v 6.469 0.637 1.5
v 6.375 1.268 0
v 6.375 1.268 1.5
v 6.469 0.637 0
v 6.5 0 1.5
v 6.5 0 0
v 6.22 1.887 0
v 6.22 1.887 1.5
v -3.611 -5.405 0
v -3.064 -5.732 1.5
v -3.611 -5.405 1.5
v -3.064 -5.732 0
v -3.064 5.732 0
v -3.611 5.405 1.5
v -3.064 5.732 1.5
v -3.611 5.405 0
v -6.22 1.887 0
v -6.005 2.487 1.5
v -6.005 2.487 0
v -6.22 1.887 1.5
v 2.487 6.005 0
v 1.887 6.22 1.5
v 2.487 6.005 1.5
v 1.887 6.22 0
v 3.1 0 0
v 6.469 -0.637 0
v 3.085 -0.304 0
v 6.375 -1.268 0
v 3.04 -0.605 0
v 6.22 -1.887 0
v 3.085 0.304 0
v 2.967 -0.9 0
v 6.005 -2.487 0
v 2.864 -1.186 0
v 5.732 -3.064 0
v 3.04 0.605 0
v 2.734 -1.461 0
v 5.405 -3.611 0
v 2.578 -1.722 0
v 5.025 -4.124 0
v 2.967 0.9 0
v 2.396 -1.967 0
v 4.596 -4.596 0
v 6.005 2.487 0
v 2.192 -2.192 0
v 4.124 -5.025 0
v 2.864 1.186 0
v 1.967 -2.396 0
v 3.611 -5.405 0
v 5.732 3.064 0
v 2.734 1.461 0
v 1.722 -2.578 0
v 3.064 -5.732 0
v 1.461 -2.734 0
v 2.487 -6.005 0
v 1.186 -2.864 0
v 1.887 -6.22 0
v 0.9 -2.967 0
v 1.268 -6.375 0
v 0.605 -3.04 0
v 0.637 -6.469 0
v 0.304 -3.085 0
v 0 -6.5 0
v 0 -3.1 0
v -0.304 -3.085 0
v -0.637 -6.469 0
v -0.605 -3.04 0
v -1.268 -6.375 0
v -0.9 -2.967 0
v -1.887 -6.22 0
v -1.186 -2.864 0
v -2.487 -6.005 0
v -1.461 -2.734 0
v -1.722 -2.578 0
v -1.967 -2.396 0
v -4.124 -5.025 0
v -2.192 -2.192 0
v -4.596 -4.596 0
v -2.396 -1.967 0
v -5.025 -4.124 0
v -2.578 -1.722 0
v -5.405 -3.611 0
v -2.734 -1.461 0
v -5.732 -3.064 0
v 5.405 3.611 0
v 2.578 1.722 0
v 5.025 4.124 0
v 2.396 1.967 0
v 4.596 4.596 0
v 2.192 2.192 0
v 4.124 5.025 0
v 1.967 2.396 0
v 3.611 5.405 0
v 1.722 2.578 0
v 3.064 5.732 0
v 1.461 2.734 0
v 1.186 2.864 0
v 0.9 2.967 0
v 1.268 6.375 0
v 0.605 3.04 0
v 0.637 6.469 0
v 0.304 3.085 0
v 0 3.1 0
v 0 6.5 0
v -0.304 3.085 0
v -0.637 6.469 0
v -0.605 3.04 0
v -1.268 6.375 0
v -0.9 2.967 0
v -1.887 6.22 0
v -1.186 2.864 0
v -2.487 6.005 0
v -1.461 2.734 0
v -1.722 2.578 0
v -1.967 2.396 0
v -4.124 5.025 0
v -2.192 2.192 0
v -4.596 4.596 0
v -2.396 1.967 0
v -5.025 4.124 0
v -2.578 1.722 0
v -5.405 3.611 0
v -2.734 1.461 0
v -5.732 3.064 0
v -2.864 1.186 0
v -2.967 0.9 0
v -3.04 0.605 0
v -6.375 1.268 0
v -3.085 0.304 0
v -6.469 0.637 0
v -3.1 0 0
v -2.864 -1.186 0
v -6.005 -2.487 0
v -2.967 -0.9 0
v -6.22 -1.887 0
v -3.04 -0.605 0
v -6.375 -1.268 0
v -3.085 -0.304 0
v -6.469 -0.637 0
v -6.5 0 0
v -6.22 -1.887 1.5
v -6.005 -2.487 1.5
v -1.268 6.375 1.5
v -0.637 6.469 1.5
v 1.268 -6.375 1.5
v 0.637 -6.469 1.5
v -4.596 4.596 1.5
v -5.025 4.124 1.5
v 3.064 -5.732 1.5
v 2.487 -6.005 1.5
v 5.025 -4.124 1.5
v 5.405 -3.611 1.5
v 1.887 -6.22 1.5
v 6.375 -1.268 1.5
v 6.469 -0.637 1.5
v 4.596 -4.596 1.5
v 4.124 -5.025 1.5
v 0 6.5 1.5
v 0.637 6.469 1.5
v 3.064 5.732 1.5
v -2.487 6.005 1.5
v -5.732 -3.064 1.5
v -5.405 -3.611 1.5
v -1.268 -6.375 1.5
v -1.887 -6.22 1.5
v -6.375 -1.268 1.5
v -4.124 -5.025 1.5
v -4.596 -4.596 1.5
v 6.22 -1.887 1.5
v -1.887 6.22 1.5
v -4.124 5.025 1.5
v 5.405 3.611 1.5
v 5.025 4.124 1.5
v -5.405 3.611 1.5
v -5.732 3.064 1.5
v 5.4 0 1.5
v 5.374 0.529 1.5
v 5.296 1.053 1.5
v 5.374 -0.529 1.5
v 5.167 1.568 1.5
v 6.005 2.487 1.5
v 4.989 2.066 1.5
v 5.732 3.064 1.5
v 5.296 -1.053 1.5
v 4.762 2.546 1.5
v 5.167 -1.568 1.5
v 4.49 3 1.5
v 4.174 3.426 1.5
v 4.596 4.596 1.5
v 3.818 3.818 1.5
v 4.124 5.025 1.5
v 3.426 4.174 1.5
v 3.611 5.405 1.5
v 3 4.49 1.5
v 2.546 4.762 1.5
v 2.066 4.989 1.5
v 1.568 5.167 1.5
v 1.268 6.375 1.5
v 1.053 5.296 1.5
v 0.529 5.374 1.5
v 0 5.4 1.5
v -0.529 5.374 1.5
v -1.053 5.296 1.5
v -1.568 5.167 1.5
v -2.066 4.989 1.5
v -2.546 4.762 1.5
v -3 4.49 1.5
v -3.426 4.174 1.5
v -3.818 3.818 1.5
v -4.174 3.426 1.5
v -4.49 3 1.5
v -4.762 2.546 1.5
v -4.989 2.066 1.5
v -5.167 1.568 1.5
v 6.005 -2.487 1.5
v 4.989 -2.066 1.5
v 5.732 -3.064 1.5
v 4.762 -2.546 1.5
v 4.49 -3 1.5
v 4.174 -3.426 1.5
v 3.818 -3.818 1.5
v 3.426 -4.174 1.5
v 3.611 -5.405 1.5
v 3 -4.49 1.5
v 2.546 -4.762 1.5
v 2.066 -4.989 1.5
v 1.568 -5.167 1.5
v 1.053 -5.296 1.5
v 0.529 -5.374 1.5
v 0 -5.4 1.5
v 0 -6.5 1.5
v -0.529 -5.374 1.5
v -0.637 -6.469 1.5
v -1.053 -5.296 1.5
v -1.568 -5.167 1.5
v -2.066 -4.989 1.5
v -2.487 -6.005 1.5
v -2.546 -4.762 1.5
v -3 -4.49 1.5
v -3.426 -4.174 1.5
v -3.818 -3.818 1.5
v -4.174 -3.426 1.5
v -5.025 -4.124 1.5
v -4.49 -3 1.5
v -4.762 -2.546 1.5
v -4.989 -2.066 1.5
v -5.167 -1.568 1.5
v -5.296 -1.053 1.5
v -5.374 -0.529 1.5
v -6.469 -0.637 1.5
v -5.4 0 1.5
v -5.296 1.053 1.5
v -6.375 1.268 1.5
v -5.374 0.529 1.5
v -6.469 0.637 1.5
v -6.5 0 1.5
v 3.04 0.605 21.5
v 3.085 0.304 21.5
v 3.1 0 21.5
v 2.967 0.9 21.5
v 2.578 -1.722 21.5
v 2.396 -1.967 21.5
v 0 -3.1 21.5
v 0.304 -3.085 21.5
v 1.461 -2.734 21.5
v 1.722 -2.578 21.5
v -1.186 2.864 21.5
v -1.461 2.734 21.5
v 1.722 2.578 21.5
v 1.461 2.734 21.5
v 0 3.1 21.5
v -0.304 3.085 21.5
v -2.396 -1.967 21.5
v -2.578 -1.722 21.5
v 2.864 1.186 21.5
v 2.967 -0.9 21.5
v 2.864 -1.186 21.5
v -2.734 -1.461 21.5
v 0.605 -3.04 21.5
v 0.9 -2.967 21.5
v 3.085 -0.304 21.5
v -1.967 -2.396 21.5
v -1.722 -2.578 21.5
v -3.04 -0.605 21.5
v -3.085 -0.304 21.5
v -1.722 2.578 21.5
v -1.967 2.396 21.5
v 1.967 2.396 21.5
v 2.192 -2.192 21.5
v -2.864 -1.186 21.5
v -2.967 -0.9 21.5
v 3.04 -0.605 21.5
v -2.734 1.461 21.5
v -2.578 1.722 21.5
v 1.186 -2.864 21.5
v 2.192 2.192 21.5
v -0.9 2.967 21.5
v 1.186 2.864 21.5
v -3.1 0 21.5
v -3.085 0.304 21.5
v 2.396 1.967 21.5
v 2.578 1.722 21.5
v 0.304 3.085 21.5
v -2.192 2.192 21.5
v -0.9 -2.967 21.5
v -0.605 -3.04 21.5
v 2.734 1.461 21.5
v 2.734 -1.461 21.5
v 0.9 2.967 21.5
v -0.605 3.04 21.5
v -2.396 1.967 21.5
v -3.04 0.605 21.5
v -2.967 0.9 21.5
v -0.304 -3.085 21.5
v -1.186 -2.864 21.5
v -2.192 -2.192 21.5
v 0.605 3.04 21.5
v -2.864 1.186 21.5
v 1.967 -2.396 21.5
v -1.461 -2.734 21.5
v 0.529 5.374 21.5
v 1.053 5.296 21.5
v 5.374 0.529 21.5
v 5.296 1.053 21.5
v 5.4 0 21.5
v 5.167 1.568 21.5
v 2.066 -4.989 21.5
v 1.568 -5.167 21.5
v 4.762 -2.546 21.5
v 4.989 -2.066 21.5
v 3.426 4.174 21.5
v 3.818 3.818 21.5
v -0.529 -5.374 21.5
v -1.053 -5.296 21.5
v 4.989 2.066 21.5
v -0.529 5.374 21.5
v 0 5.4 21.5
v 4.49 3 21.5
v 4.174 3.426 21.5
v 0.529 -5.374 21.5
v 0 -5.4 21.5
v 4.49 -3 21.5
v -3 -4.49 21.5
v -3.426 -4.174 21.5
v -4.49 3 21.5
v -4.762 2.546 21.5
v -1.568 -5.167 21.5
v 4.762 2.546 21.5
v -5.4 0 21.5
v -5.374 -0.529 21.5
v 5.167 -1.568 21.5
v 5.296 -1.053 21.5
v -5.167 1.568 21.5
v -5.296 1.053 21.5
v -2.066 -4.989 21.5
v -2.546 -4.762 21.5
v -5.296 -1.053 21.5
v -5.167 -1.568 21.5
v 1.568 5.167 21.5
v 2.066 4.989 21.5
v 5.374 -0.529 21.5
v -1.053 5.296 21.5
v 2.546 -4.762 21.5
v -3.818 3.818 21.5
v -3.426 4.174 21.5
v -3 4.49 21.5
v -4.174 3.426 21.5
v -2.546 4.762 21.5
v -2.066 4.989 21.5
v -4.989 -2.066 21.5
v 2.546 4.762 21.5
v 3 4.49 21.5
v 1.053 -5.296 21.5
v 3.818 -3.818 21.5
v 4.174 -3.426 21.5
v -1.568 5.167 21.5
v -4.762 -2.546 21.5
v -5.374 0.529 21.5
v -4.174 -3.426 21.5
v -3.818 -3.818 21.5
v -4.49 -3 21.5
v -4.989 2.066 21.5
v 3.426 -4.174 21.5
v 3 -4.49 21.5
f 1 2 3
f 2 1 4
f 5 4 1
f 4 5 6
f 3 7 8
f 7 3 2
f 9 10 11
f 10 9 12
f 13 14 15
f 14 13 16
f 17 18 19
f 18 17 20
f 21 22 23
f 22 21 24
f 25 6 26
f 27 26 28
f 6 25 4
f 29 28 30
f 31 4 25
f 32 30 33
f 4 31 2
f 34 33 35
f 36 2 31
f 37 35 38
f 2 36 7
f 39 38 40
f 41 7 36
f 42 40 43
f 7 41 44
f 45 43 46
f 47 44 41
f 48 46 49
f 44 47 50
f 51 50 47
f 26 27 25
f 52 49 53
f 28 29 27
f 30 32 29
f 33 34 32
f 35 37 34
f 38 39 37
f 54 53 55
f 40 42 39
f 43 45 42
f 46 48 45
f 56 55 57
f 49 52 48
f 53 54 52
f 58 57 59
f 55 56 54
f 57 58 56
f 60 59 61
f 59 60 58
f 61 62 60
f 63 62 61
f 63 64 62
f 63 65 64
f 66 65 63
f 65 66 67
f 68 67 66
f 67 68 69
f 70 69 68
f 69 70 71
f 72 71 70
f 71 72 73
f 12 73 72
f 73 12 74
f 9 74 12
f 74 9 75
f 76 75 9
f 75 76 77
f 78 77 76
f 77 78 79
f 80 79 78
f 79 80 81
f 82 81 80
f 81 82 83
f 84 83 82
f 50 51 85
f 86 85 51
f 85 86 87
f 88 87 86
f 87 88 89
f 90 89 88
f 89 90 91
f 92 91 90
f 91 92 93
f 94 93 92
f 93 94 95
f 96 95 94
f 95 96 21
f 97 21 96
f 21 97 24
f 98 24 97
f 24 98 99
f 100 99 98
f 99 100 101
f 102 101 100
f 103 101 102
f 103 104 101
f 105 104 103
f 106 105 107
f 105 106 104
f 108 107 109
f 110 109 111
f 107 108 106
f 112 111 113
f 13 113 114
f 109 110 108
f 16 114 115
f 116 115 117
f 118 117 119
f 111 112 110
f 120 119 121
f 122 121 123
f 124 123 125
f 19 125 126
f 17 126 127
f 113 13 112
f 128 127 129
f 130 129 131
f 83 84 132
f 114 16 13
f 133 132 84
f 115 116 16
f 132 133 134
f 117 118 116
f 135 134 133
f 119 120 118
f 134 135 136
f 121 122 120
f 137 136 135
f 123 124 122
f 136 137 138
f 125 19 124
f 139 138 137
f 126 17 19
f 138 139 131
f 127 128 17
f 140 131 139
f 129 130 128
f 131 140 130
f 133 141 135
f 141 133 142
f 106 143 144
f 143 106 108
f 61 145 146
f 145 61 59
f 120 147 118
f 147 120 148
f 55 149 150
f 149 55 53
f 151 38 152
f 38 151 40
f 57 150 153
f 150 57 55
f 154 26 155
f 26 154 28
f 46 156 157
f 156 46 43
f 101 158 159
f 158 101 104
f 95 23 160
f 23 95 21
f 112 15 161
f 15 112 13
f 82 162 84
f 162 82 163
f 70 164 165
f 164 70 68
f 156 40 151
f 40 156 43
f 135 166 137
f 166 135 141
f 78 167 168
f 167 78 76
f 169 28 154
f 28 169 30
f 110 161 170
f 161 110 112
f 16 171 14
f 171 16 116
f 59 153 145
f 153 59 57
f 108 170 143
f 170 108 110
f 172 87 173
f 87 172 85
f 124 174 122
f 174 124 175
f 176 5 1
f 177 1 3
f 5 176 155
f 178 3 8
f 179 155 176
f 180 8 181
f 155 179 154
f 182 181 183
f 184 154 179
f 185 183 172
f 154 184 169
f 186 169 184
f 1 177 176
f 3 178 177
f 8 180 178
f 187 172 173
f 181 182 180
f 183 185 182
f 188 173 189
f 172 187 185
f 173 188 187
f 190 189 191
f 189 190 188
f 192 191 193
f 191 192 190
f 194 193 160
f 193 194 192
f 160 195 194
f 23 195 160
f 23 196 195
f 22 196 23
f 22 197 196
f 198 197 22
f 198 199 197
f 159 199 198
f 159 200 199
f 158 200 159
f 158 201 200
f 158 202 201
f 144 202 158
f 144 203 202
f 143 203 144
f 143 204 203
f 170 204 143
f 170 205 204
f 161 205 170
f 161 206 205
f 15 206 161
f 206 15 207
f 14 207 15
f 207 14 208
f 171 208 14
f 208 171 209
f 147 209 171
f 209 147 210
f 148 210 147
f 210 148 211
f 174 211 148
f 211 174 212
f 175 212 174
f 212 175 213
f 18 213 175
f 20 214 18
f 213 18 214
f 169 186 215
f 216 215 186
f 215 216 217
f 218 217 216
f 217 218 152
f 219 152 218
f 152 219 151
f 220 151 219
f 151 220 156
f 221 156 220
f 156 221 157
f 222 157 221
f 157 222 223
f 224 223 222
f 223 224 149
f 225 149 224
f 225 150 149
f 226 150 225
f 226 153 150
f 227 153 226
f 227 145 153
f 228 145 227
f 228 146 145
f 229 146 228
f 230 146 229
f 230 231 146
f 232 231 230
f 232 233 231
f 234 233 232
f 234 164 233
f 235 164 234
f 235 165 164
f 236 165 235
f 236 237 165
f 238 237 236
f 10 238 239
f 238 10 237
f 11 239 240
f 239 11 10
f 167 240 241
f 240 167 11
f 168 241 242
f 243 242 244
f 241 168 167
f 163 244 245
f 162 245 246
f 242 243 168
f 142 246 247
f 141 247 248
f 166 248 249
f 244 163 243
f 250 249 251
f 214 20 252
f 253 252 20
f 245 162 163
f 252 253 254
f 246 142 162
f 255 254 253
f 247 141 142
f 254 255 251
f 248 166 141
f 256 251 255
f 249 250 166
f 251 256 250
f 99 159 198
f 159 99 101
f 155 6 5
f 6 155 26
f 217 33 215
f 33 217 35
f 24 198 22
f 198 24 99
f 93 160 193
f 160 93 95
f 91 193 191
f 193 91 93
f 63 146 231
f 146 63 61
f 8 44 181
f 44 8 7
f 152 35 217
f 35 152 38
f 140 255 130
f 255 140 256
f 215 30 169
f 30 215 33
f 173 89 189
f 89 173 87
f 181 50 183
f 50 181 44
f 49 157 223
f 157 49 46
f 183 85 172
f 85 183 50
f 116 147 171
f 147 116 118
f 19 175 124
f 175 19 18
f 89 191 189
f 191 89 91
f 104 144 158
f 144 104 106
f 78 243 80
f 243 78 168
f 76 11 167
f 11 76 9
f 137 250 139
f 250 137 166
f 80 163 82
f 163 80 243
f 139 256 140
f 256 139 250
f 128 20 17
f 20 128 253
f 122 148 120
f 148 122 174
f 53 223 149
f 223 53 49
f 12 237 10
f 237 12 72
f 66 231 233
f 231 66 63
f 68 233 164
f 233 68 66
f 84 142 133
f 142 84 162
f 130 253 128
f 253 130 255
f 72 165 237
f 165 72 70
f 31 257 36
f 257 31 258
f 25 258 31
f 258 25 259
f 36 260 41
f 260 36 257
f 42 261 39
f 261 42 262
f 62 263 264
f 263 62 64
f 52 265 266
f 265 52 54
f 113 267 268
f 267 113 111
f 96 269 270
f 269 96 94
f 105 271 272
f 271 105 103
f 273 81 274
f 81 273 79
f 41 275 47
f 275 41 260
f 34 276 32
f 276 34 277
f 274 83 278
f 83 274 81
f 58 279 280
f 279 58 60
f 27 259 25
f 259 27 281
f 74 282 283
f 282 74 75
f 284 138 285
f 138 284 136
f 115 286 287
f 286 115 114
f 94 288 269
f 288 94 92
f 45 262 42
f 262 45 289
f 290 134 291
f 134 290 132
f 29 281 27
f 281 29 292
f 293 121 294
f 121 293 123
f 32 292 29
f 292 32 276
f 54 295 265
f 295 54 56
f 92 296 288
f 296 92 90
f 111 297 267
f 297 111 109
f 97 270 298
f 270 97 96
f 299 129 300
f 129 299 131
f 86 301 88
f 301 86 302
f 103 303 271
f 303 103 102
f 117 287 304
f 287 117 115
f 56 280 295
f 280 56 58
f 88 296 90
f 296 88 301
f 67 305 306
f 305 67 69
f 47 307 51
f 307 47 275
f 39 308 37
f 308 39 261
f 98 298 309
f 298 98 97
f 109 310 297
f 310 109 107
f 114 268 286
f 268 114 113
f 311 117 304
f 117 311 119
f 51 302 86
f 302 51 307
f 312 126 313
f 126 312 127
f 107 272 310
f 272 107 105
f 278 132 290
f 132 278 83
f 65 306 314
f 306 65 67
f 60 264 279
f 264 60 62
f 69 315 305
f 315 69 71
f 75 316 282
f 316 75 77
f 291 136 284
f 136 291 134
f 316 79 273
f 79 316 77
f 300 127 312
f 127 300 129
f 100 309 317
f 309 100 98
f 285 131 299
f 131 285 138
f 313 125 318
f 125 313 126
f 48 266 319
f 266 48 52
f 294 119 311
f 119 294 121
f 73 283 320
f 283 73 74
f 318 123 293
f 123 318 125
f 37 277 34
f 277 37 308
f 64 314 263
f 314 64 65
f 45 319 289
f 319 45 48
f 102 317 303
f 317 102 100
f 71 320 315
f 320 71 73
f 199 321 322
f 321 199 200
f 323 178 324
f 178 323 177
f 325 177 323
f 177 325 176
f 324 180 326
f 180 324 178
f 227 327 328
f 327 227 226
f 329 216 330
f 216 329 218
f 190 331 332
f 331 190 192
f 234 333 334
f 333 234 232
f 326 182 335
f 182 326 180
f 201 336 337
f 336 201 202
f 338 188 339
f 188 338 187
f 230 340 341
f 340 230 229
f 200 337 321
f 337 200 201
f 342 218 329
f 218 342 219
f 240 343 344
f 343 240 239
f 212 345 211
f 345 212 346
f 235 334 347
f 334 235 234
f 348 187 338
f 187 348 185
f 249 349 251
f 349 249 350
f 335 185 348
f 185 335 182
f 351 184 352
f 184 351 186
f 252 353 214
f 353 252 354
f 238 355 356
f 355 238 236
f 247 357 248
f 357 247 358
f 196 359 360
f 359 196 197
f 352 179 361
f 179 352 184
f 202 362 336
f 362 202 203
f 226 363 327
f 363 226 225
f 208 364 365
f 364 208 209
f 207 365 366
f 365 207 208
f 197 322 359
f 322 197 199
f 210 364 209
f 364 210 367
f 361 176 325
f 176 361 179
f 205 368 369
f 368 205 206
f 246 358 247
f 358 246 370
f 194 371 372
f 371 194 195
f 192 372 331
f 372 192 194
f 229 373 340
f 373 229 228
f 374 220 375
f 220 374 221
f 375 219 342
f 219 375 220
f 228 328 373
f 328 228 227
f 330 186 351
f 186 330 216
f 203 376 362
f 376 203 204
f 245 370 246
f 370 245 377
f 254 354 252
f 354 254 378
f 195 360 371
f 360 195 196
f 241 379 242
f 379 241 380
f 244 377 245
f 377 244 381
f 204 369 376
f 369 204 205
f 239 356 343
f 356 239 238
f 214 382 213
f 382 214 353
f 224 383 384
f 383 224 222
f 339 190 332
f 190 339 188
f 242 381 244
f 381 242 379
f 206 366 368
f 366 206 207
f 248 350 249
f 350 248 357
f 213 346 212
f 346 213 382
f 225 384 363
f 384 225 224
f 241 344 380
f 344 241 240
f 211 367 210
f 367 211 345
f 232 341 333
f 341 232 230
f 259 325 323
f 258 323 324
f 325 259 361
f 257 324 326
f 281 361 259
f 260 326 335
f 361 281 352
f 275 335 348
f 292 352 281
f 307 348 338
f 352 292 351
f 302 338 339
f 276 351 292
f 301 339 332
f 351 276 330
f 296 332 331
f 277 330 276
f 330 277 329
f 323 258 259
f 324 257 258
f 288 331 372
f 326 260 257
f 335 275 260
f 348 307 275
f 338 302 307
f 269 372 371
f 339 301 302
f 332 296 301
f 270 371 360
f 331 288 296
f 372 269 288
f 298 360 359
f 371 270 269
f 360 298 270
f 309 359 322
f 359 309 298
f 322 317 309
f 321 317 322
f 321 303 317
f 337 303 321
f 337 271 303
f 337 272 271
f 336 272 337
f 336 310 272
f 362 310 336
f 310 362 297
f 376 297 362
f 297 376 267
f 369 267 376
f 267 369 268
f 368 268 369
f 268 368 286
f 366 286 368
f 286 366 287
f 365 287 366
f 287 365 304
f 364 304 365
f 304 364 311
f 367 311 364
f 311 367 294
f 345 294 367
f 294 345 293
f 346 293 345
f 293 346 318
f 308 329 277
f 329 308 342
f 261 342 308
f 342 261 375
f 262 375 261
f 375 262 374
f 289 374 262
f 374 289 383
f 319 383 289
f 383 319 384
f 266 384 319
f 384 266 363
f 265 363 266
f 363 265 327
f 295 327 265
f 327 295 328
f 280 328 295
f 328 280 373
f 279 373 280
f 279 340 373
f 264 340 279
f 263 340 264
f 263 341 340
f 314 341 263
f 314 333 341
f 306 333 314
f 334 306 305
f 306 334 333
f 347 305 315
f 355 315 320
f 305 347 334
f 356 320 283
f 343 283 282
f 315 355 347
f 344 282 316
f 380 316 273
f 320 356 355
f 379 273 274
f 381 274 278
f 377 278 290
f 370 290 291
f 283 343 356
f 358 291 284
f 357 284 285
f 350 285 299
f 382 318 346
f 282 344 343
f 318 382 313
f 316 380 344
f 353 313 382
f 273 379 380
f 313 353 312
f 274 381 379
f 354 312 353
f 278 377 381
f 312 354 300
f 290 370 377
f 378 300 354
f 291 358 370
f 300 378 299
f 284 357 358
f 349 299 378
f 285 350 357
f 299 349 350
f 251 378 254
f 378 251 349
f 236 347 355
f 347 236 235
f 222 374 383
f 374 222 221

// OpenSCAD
// Dimensions for PCR tube adapter sleeve (0.2 mL tube in 1.5 mL rack hole)
// All units in millimetres

// Collar dimensions (base resting on build plate)
collar_diameter = 13;
collar_height = 1.5;

// Sleeve body dimensions
sleeve_outer_diameter = 10.8;
sleeve_height = 21.5 - collar_height; // Total height 21.5, subtract collar

// Bore dimensions (for 0.2 mL tube)
bore_diameter = 6.2;

// Safety margin for printing tolerance (slight clearance)
// The bore is slightly larger than 6.2mm to ensure fit, but user specified 6.2mm.
// We will use 6.2mm exactly as requested, relying on FDM tolerance.
// However, for the difference operation, we ensure the cutter extends past faces.

// Set resolution for curved surfaces
$fn = 64;

// Define the collar (base)
module collar() {
    difference() {
        // Main collar cylinder
        cylinder(h = collar_height, d = collar_diameter, center = false);
        
        // Cut the bore through the collar
        // Extends 0.5mm past the top face to ensure clean cut
        translate([0, 0, -0.5])
            cylinder(h = collar_height + 1, d = bore_diameter, center = false);
    }
}

// Define the sleeve body (rises from collar)
module sleeve_body() {
    difference() {
        // Main sleeve cylinder
        // Positioned on top of collar, so base is at z = collar_height
        translate([0, 0, collar_height])
            cylinder(h = sleeve_height, d = sleeve_outer_diameter, center = false);
        
        // Cut the bore through the sleeve body
        // Extends 0.5mm past the top face to ensure clean cut
        translate([0, 0, collar_height - 0.5])
            cylinder(h = sleeve_height + 1, d = bore_diameter, center = false);
    }
}

// Combine collar and sleeve body
union() {
    collar();
    sleeve_body();
}

// Final assembly
// The entire part is centered at origin in X/Y, resting on Z=0
translate([0, 0, 0]) {
    union();
}
